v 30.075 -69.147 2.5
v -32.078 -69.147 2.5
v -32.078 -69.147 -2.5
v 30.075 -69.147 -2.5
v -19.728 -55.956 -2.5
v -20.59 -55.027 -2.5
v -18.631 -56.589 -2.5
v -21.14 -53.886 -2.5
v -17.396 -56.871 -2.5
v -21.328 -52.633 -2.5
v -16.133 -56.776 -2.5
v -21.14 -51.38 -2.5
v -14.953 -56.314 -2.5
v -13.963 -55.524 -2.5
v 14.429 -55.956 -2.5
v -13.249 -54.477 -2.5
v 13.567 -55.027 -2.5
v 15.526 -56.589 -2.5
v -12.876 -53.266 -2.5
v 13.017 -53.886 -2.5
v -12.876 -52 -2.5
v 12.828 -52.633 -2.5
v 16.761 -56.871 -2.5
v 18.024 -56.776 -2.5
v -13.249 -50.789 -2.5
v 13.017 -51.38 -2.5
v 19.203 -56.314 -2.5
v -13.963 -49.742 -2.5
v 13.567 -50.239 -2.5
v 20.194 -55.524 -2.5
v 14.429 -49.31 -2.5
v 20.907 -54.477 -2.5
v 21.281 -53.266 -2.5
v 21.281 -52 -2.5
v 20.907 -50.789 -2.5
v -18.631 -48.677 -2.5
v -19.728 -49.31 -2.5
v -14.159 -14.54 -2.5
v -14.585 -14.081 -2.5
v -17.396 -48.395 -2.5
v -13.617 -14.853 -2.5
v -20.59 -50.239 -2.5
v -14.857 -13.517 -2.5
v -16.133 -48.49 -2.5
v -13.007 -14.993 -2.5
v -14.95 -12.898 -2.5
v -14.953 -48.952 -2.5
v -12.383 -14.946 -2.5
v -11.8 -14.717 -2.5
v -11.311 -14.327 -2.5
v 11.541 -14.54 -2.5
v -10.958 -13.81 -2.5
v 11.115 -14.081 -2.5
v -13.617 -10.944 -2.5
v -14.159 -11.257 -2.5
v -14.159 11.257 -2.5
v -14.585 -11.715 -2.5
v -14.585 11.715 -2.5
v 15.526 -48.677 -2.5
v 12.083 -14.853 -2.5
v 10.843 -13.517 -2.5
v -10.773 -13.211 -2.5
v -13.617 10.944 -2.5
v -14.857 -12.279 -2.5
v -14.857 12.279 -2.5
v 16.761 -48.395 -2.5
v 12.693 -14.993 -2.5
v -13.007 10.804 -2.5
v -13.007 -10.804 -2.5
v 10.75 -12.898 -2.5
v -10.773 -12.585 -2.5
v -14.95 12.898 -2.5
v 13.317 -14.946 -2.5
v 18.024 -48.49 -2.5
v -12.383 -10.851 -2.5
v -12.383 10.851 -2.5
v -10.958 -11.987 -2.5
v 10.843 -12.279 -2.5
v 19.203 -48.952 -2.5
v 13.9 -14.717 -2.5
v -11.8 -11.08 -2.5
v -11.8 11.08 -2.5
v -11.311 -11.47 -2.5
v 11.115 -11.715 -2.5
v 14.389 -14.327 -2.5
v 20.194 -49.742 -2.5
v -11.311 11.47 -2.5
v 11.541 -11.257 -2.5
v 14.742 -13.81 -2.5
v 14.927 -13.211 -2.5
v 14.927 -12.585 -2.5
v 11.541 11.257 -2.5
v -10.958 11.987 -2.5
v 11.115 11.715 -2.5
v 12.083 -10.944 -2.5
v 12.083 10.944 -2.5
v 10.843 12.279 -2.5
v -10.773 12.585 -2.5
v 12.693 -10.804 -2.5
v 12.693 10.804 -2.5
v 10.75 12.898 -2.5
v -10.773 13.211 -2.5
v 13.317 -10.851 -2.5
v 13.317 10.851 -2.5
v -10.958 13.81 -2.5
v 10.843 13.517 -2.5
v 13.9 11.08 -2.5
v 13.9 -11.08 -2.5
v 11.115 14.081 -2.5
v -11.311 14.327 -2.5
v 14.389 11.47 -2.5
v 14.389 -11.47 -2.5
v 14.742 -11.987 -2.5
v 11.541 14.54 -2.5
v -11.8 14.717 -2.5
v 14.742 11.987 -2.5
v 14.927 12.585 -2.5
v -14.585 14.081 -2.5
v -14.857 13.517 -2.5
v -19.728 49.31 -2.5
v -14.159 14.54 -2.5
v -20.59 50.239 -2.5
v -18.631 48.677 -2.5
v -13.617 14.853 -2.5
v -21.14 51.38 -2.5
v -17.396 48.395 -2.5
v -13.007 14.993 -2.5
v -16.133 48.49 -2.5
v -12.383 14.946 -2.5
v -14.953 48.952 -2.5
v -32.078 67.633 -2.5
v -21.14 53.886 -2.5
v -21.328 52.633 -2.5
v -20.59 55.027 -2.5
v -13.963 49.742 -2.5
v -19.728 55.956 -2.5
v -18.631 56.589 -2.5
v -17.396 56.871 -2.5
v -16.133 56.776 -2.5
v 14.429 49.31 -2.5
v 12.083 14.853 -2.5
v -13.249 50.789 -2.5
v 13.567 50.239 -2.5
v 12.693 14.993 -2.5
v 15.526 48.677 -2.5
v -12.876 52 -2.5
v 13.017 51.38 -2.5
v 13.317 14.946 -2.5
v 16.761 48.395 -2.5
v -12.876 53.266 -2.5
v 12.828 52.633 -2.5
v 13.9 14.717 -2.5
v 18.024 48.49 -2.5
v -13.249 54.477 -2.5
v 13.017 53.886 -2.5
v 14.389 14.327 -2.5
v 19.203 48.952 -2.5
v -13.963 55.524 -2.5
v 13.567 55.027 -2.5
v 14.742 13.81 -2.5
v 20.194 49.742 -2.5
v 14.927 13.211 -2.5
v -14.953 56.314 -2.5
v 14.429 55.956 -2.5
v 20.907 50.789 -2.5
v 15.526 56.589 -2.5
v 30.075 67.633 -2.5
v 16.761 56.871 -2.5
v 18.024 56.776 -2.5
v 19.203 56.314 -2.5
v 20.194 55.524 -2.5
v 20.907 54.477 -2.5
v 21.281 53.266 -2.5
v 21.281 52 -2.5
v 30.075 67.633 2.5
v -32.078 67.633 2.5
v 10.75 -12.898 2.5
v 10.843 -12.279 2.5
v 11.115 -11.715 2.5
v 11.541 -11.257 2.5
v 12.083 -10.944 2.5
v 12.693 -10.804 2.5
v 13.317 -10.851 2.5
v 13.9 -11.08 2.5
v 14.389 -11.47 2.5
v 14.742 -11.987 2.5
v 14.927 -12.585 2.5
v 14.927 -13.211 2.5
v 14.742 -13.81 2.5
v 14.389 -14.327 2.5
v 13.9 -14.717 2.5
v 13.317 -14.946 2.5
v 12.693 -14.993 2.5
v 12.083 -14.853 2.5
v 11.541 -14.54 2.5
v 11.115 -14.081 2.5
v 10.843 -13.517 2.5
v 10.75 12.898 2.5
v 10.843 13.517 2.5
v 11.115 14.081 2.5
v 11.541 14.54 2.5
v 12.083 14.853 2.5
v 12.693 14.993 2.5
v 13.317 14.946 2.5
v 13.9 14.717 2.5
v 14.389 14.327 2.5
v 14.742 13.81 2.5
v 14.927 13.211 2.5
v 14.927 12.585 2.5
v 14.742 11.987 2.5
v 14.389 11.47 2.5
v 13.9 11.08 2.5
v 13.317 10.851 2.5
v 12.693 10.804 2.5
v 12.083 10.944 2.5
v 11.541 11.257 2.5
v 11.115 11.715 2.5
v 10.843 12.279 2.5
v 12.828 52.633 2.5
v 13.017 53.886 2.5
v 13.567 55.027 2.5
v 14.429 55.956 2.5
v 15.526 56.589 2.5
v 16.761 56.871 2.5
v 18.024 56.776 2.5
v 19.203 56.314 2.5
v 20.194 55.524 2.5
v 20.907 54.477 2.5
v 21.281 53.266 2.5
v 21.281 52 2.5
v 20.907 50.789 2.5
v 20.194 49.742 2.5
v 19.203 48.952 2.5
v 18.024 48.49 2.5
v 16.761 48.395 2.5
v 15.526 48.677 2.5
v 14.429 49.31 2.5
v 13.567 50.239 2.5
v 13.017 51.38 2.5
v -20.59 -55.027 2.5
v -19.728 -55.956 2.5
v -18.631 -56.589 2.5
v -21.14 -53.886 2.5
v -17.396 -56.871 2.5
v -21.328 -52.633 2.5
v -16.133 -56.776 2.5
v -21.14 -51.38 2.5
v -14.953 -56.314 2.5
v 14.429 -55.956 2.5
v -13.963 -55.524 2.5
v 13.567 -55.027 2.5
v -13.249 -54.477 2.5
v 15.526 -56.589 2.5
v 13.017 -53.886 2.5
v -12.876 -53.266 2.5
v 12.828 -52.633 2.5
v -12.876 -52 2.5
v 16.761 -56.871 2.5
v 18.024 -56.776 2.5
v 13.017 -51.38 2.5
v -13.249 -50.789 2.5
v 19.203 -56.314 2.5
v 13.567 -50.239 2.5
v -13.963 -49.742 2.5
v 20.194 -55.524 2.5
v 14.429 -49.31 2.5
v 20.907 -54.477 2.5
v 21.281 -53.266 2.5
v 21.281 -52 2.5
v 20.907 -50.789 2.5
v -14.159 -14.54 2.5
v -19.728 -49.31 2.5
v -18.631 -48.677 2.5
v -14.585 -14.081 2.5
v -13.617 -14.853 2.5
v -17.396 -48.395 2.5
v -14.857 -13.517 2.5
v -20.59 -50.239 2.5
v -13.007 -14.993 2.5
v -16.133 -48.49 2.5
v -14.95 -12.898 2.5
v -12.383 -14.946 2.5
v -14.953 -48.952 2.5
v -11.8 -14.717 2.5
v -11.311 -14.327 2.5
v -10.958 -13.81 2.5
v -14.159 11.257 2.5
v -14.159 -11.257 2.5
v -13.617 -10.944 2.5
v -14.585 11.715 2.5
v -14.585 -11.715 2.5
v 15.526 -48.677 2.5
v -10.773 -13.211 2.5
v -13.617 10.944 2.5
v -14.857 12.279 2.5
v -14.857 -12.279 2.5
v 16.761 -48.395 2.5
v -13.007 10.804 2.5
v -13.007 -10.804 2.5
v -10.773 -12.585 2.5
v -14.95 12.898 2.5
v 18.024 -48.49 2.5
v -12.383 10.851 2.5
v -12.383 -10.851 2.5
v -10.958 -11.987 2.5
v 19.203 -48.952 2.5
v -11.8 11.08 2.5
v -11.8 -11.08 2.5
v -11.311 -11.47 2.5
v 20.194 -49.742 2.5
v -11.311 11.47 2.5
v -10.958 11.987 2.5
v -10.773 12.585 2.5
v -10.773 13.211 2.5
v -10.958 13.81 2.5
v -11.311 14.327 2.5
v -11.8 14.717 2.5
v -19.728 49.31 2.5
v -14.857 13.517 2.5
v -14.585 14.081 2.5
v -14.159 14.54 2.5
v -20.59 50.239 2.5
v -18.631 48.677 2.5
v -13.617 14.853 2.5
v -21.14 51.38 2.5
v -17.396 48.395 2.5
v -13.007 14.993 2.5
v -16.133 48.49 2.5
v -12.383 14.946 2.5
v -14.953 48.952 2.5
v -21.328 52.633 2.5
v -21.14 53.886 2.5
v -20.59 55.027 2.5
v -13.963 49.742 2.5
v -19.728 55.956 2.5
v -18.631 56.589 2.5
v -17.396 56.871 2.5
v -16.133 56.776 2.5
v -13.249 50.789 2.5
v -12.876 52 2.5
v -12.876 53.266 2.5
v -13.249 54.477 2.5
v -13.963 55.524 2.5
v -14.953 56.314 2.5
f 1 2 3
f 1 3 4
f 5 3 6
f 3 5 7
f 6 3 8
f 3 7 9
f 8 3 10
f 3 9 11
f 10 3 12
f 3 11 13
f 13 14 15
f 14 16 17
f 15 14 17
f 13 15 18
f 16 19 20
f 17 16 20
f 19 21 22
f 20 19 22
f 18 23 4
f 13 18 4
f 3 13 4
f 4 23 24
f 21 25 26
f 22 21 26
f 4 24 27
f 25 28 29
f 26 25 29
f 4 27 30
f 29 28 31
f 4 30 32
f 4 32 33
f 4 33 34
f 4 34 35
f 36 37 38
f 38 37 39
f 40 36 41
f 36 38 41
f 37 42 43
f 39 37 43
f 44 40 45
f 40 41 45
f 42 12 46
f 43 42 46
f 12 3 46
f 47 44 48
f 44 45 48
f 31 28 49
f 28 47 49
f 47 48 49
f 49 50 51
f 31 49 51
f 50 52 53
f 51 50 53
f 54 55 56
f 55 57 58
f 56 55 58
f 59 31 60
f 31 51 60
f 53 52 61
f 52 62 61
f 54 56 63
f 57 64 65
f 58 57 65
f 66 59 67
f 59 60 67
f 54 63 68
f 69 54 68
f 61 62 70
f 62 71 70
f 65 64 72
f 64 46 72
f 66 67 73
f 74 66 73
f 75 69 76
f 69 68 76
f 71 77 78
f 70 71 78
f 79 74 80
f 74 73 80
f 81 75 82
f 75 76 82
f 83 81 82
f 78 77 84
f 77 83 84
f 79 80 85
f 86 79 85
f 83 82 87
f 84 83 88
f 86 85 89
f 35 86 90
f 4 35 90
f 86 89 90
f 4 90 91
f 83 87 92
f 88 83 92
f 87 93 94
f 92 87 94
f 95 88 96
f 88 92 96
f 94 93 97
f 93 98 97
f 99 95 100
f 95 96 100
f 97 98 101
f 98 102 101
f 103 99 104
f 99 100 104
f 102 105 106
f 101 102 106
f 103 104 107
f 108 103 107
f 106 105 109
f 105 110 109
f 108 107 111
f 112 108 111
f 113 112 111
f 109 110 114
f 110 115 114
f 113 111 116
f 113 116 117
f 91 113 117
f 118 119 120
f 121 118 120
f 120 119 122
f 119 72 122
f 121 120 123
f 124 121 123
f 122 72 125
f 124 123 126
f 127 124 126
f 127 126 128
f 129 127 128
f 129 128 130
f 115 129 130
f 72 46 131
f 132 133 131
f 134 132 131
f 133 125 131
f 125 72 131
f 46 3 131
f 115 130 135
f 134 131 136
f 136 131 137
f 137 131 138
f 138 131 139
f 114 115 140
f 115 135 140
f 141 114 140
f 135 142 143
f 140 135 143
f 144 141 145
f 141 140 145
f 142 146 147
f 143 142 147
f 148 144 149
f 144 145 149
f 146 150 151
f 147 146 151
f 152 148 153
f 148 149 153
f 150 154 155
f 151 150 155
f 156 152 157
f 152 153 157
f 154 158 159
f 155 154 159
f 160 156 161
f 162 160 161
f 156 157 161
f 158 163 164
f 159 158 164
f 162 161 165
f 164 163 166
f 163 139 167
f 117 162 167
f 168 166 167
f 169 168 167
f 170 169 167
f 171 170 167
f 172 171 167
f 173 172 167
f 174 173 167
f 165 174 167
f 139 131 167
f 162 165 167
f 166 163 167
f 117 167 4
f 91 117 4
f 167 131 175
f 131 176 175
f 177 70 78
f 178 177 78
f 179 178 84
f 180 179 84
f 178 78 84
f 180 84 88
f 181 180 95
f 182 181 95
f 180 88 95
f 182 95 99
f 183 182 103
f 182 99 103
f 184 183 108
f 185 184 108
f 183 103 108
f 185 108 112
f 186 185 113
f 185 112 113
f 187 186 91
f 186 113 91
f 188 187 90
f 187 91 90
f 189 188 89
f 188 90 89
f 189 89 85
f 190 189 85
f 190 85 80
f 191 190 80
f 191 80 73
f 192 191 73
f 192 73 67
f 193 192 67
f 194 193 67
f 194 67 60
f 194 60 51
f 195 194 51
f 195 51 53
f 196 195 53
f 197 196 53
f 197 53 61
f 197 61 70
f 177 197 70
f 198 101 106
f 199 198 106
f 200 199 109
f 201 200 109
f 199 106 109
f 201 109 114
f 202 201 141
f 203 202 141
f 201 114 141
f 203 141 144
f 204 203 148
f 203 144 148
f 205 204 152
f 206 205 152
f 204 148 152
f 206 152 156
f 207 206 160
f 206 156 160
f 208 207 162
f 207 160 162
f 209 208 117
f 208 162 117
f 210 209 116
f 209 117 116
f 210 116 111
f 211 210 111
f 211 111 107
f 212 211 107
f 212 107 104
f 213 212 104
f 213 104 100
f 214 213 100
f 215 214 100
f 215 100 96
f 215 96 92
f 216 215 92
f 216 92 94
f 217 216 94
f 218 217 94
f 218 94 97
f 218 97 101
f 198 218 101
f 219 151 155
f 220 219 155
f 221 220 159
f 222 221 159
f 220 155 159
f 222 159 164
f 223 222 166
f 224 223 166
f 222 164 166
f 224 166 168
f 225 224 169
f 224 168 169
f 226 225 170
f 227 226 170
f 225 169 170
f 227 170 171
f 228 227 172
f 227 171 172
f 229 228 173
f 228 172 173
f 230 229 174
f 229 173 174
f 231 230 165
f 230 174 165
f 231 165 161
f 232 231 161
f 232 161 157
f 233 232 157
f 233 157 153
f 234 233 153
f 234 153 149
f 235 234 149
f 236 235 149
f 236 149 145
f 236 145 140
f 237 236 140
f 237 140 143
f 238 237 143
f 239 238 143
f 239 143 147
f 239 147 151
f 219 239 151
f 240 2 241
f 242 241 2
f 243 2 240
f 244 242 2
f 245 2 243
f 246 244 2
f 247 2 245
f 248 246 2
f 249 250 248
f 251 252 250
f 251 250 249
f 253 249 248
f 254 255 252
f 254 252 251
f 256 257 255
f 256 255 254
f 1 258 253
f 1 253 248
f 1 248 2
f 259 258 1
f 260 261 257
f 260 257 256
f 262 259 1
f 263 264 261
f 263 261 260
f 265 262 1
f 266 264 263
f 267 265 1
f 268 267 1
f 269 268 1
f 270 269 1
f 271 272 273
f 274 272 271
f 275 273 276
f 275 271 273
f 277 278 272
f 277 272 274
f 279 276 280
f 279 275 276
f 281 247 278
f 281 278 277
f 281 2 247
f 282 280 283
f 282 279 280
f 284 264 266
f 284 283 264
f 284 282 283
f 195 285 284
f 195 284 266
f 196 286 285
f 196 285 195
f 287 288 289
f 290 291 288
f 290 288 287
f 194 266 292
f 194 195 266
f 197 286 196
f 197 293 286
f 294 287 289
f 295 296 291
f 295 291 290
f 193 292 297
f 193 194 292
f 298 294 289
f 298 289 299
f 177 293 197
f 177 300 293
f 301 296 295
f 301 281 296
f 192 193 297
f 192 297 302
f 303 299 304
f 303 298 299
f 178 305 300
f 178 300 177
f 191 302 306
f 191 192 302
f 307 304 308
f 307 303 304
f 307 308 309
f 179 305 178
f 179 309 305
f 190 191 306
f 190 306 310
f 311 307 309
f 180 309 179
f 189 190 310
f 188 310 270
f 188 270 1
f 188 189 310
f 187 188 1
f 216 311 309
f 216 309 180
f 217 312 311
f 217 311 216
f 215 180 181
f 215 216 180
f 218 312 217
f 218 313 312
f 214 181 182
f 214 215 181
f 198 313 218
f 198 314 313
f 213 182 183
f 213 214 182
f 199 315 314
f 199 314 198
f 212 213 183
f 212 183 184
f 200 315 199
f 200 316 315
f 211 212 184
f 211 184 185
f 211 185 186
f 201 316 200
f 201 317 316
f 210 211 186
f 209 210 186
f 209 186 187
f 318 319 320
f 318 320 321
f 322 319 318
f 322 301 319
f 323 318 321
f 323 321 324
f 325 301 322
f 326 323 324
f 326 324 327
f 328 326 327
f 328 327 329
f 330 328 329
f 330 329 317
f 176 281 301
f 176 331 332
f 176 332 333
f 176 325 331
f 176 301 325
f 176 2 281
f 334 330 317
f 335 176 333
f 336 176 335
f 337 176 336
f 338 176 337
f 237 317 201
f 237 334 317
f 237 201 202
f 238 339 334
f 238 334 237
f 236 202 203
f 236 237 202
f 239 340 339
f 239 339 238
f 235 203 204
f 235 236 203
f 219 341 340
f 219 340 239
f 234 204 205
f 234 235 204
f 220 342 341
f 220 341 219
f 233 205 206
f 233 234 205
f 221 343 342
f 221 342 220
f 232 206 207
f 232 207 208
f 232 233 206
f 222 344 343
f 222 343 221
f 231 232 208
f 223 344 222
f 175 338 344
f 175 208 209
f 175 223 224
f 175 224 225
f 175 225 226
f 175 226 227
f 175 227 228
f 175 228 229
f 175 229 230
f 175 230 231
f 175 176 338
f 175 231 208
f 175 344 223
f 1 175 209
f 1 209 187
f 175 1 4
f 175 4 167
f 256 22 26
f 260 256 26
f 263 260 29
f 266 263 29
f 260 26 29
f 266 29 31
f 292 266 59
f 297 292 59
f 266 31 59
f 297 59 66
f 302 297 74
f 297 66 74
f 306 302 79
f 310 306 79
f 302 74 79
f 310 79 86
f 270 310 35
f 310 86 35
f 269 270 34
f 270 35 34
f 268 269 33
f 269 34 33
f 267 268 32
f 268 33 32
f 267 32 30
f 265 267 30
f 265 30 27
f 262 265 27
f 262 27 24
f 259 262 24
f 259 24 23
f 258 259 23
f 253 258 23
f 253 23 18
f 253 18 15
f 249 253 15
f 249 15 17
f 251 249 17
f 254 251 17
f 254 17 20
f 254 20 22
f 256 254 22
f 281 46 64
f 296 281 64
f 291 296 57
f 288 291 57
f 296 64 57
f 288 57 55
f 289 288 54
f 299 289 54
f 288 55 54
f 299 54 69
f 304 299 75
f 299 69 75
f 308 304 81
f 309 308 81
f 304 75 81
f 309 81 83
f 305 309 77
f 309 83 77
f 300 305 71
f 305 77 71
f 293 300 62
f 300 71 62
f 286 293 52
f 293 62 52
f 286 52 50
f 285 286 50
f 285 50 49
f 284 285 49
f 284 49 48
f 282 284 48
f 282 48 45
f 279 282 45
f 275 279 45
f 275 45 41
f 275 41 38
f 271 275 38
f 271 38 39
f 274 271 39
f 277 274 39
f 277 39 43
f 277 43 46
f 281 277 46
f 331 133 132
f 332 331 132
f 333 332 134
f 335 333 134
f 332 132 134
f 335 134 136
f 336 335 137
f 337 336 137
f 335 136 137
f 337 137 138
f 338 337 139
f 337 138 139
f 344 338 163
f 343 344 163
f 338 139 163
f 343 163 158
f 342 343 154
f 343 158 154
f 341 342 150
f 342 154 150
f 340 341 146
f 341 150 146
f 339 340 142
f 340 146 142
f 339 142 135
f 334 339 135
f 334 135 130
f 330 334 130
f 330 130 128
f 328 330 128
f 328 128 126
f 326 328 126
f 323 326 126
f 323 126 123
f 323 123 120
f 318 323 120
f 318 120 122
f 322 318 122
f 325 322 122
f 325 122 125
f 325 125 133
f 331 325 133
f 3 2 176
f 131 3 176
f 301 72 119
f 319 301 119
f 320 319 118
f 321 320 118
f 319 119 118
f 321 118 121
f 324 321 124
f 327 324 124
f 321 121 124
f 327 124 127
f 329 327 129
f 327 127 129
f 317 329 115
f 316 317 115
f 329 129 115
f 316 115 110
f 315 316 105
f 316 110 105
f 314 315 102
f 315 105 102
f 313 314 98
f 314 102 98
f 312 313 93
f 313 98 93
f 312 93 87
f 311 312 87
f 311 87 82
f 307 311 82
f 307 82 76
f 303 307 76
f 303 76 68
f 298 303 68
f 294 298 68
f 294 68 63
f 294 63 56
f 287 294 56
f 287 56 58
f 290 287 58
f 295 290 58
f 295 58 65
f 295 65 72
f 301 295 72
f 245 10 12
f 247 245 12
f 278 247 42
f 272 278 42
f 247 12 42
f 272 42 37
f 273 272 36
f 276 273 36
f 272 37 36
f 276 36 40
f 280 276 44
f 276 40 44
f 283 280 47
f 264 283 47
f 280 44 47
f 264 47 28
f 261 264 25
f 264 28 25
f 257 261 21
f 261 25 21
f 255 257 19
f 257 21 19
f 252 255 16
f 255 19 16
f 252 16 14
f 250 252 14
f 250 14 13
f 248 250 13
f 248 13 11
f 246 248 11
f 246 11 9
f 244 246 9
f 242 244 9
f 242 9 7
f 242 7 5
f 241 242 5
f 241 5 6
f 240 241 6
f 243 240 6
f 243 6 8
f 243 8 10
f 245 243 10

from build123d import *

# Parameters (mm, degrees)
F0_W     = 62.1536839753
F0_H     = 136.7805153131
F1_DEPTH = 2.5
F3_D     = 4.2
F5_D     = 8.5
F5_DEPTH = 17.2
F5_TIP   = 2.5536576309


with BuildPart() as f1:
    # F0 (on Top) → F1 (new body, symmetric)
    with BuildSketch(Plane.XY):
        with Locations((-1.0015358767, -0.7572177634)):
            Rectangle(F0_W, F0_H)
    extrude(amount=F1_DEPTH, both=True)

    # F3 (through all)
    with Locations(Plane.XY.offset(2.5)):
        with Locations((-12.85, -12.898471453), (-12.85, 12.898471453), (12.85, -12.898471453), (12.85, 12.898471453)):
            Hole(F3_D / 2)

    # F5
    with Locations(Plane.XY.offset(2.5)):
        with Locations((-17.0783778643, 52.6330398932), (17.0783778643, 52.6330398932), (17.0783778643, -52.6330398932), (-17.0783778643, -52.6330398932)):
            Hole(F5_D / 2, depth=F5_DEPTH)
            with Locations((0, 0, -(F5_DEPTH + F5_TIP / 2))):  # 118° drill point
                Cone(0, F5_D / 2, F5_TIP, mode=Mode.SUBTRACT)


solid = f1.part
